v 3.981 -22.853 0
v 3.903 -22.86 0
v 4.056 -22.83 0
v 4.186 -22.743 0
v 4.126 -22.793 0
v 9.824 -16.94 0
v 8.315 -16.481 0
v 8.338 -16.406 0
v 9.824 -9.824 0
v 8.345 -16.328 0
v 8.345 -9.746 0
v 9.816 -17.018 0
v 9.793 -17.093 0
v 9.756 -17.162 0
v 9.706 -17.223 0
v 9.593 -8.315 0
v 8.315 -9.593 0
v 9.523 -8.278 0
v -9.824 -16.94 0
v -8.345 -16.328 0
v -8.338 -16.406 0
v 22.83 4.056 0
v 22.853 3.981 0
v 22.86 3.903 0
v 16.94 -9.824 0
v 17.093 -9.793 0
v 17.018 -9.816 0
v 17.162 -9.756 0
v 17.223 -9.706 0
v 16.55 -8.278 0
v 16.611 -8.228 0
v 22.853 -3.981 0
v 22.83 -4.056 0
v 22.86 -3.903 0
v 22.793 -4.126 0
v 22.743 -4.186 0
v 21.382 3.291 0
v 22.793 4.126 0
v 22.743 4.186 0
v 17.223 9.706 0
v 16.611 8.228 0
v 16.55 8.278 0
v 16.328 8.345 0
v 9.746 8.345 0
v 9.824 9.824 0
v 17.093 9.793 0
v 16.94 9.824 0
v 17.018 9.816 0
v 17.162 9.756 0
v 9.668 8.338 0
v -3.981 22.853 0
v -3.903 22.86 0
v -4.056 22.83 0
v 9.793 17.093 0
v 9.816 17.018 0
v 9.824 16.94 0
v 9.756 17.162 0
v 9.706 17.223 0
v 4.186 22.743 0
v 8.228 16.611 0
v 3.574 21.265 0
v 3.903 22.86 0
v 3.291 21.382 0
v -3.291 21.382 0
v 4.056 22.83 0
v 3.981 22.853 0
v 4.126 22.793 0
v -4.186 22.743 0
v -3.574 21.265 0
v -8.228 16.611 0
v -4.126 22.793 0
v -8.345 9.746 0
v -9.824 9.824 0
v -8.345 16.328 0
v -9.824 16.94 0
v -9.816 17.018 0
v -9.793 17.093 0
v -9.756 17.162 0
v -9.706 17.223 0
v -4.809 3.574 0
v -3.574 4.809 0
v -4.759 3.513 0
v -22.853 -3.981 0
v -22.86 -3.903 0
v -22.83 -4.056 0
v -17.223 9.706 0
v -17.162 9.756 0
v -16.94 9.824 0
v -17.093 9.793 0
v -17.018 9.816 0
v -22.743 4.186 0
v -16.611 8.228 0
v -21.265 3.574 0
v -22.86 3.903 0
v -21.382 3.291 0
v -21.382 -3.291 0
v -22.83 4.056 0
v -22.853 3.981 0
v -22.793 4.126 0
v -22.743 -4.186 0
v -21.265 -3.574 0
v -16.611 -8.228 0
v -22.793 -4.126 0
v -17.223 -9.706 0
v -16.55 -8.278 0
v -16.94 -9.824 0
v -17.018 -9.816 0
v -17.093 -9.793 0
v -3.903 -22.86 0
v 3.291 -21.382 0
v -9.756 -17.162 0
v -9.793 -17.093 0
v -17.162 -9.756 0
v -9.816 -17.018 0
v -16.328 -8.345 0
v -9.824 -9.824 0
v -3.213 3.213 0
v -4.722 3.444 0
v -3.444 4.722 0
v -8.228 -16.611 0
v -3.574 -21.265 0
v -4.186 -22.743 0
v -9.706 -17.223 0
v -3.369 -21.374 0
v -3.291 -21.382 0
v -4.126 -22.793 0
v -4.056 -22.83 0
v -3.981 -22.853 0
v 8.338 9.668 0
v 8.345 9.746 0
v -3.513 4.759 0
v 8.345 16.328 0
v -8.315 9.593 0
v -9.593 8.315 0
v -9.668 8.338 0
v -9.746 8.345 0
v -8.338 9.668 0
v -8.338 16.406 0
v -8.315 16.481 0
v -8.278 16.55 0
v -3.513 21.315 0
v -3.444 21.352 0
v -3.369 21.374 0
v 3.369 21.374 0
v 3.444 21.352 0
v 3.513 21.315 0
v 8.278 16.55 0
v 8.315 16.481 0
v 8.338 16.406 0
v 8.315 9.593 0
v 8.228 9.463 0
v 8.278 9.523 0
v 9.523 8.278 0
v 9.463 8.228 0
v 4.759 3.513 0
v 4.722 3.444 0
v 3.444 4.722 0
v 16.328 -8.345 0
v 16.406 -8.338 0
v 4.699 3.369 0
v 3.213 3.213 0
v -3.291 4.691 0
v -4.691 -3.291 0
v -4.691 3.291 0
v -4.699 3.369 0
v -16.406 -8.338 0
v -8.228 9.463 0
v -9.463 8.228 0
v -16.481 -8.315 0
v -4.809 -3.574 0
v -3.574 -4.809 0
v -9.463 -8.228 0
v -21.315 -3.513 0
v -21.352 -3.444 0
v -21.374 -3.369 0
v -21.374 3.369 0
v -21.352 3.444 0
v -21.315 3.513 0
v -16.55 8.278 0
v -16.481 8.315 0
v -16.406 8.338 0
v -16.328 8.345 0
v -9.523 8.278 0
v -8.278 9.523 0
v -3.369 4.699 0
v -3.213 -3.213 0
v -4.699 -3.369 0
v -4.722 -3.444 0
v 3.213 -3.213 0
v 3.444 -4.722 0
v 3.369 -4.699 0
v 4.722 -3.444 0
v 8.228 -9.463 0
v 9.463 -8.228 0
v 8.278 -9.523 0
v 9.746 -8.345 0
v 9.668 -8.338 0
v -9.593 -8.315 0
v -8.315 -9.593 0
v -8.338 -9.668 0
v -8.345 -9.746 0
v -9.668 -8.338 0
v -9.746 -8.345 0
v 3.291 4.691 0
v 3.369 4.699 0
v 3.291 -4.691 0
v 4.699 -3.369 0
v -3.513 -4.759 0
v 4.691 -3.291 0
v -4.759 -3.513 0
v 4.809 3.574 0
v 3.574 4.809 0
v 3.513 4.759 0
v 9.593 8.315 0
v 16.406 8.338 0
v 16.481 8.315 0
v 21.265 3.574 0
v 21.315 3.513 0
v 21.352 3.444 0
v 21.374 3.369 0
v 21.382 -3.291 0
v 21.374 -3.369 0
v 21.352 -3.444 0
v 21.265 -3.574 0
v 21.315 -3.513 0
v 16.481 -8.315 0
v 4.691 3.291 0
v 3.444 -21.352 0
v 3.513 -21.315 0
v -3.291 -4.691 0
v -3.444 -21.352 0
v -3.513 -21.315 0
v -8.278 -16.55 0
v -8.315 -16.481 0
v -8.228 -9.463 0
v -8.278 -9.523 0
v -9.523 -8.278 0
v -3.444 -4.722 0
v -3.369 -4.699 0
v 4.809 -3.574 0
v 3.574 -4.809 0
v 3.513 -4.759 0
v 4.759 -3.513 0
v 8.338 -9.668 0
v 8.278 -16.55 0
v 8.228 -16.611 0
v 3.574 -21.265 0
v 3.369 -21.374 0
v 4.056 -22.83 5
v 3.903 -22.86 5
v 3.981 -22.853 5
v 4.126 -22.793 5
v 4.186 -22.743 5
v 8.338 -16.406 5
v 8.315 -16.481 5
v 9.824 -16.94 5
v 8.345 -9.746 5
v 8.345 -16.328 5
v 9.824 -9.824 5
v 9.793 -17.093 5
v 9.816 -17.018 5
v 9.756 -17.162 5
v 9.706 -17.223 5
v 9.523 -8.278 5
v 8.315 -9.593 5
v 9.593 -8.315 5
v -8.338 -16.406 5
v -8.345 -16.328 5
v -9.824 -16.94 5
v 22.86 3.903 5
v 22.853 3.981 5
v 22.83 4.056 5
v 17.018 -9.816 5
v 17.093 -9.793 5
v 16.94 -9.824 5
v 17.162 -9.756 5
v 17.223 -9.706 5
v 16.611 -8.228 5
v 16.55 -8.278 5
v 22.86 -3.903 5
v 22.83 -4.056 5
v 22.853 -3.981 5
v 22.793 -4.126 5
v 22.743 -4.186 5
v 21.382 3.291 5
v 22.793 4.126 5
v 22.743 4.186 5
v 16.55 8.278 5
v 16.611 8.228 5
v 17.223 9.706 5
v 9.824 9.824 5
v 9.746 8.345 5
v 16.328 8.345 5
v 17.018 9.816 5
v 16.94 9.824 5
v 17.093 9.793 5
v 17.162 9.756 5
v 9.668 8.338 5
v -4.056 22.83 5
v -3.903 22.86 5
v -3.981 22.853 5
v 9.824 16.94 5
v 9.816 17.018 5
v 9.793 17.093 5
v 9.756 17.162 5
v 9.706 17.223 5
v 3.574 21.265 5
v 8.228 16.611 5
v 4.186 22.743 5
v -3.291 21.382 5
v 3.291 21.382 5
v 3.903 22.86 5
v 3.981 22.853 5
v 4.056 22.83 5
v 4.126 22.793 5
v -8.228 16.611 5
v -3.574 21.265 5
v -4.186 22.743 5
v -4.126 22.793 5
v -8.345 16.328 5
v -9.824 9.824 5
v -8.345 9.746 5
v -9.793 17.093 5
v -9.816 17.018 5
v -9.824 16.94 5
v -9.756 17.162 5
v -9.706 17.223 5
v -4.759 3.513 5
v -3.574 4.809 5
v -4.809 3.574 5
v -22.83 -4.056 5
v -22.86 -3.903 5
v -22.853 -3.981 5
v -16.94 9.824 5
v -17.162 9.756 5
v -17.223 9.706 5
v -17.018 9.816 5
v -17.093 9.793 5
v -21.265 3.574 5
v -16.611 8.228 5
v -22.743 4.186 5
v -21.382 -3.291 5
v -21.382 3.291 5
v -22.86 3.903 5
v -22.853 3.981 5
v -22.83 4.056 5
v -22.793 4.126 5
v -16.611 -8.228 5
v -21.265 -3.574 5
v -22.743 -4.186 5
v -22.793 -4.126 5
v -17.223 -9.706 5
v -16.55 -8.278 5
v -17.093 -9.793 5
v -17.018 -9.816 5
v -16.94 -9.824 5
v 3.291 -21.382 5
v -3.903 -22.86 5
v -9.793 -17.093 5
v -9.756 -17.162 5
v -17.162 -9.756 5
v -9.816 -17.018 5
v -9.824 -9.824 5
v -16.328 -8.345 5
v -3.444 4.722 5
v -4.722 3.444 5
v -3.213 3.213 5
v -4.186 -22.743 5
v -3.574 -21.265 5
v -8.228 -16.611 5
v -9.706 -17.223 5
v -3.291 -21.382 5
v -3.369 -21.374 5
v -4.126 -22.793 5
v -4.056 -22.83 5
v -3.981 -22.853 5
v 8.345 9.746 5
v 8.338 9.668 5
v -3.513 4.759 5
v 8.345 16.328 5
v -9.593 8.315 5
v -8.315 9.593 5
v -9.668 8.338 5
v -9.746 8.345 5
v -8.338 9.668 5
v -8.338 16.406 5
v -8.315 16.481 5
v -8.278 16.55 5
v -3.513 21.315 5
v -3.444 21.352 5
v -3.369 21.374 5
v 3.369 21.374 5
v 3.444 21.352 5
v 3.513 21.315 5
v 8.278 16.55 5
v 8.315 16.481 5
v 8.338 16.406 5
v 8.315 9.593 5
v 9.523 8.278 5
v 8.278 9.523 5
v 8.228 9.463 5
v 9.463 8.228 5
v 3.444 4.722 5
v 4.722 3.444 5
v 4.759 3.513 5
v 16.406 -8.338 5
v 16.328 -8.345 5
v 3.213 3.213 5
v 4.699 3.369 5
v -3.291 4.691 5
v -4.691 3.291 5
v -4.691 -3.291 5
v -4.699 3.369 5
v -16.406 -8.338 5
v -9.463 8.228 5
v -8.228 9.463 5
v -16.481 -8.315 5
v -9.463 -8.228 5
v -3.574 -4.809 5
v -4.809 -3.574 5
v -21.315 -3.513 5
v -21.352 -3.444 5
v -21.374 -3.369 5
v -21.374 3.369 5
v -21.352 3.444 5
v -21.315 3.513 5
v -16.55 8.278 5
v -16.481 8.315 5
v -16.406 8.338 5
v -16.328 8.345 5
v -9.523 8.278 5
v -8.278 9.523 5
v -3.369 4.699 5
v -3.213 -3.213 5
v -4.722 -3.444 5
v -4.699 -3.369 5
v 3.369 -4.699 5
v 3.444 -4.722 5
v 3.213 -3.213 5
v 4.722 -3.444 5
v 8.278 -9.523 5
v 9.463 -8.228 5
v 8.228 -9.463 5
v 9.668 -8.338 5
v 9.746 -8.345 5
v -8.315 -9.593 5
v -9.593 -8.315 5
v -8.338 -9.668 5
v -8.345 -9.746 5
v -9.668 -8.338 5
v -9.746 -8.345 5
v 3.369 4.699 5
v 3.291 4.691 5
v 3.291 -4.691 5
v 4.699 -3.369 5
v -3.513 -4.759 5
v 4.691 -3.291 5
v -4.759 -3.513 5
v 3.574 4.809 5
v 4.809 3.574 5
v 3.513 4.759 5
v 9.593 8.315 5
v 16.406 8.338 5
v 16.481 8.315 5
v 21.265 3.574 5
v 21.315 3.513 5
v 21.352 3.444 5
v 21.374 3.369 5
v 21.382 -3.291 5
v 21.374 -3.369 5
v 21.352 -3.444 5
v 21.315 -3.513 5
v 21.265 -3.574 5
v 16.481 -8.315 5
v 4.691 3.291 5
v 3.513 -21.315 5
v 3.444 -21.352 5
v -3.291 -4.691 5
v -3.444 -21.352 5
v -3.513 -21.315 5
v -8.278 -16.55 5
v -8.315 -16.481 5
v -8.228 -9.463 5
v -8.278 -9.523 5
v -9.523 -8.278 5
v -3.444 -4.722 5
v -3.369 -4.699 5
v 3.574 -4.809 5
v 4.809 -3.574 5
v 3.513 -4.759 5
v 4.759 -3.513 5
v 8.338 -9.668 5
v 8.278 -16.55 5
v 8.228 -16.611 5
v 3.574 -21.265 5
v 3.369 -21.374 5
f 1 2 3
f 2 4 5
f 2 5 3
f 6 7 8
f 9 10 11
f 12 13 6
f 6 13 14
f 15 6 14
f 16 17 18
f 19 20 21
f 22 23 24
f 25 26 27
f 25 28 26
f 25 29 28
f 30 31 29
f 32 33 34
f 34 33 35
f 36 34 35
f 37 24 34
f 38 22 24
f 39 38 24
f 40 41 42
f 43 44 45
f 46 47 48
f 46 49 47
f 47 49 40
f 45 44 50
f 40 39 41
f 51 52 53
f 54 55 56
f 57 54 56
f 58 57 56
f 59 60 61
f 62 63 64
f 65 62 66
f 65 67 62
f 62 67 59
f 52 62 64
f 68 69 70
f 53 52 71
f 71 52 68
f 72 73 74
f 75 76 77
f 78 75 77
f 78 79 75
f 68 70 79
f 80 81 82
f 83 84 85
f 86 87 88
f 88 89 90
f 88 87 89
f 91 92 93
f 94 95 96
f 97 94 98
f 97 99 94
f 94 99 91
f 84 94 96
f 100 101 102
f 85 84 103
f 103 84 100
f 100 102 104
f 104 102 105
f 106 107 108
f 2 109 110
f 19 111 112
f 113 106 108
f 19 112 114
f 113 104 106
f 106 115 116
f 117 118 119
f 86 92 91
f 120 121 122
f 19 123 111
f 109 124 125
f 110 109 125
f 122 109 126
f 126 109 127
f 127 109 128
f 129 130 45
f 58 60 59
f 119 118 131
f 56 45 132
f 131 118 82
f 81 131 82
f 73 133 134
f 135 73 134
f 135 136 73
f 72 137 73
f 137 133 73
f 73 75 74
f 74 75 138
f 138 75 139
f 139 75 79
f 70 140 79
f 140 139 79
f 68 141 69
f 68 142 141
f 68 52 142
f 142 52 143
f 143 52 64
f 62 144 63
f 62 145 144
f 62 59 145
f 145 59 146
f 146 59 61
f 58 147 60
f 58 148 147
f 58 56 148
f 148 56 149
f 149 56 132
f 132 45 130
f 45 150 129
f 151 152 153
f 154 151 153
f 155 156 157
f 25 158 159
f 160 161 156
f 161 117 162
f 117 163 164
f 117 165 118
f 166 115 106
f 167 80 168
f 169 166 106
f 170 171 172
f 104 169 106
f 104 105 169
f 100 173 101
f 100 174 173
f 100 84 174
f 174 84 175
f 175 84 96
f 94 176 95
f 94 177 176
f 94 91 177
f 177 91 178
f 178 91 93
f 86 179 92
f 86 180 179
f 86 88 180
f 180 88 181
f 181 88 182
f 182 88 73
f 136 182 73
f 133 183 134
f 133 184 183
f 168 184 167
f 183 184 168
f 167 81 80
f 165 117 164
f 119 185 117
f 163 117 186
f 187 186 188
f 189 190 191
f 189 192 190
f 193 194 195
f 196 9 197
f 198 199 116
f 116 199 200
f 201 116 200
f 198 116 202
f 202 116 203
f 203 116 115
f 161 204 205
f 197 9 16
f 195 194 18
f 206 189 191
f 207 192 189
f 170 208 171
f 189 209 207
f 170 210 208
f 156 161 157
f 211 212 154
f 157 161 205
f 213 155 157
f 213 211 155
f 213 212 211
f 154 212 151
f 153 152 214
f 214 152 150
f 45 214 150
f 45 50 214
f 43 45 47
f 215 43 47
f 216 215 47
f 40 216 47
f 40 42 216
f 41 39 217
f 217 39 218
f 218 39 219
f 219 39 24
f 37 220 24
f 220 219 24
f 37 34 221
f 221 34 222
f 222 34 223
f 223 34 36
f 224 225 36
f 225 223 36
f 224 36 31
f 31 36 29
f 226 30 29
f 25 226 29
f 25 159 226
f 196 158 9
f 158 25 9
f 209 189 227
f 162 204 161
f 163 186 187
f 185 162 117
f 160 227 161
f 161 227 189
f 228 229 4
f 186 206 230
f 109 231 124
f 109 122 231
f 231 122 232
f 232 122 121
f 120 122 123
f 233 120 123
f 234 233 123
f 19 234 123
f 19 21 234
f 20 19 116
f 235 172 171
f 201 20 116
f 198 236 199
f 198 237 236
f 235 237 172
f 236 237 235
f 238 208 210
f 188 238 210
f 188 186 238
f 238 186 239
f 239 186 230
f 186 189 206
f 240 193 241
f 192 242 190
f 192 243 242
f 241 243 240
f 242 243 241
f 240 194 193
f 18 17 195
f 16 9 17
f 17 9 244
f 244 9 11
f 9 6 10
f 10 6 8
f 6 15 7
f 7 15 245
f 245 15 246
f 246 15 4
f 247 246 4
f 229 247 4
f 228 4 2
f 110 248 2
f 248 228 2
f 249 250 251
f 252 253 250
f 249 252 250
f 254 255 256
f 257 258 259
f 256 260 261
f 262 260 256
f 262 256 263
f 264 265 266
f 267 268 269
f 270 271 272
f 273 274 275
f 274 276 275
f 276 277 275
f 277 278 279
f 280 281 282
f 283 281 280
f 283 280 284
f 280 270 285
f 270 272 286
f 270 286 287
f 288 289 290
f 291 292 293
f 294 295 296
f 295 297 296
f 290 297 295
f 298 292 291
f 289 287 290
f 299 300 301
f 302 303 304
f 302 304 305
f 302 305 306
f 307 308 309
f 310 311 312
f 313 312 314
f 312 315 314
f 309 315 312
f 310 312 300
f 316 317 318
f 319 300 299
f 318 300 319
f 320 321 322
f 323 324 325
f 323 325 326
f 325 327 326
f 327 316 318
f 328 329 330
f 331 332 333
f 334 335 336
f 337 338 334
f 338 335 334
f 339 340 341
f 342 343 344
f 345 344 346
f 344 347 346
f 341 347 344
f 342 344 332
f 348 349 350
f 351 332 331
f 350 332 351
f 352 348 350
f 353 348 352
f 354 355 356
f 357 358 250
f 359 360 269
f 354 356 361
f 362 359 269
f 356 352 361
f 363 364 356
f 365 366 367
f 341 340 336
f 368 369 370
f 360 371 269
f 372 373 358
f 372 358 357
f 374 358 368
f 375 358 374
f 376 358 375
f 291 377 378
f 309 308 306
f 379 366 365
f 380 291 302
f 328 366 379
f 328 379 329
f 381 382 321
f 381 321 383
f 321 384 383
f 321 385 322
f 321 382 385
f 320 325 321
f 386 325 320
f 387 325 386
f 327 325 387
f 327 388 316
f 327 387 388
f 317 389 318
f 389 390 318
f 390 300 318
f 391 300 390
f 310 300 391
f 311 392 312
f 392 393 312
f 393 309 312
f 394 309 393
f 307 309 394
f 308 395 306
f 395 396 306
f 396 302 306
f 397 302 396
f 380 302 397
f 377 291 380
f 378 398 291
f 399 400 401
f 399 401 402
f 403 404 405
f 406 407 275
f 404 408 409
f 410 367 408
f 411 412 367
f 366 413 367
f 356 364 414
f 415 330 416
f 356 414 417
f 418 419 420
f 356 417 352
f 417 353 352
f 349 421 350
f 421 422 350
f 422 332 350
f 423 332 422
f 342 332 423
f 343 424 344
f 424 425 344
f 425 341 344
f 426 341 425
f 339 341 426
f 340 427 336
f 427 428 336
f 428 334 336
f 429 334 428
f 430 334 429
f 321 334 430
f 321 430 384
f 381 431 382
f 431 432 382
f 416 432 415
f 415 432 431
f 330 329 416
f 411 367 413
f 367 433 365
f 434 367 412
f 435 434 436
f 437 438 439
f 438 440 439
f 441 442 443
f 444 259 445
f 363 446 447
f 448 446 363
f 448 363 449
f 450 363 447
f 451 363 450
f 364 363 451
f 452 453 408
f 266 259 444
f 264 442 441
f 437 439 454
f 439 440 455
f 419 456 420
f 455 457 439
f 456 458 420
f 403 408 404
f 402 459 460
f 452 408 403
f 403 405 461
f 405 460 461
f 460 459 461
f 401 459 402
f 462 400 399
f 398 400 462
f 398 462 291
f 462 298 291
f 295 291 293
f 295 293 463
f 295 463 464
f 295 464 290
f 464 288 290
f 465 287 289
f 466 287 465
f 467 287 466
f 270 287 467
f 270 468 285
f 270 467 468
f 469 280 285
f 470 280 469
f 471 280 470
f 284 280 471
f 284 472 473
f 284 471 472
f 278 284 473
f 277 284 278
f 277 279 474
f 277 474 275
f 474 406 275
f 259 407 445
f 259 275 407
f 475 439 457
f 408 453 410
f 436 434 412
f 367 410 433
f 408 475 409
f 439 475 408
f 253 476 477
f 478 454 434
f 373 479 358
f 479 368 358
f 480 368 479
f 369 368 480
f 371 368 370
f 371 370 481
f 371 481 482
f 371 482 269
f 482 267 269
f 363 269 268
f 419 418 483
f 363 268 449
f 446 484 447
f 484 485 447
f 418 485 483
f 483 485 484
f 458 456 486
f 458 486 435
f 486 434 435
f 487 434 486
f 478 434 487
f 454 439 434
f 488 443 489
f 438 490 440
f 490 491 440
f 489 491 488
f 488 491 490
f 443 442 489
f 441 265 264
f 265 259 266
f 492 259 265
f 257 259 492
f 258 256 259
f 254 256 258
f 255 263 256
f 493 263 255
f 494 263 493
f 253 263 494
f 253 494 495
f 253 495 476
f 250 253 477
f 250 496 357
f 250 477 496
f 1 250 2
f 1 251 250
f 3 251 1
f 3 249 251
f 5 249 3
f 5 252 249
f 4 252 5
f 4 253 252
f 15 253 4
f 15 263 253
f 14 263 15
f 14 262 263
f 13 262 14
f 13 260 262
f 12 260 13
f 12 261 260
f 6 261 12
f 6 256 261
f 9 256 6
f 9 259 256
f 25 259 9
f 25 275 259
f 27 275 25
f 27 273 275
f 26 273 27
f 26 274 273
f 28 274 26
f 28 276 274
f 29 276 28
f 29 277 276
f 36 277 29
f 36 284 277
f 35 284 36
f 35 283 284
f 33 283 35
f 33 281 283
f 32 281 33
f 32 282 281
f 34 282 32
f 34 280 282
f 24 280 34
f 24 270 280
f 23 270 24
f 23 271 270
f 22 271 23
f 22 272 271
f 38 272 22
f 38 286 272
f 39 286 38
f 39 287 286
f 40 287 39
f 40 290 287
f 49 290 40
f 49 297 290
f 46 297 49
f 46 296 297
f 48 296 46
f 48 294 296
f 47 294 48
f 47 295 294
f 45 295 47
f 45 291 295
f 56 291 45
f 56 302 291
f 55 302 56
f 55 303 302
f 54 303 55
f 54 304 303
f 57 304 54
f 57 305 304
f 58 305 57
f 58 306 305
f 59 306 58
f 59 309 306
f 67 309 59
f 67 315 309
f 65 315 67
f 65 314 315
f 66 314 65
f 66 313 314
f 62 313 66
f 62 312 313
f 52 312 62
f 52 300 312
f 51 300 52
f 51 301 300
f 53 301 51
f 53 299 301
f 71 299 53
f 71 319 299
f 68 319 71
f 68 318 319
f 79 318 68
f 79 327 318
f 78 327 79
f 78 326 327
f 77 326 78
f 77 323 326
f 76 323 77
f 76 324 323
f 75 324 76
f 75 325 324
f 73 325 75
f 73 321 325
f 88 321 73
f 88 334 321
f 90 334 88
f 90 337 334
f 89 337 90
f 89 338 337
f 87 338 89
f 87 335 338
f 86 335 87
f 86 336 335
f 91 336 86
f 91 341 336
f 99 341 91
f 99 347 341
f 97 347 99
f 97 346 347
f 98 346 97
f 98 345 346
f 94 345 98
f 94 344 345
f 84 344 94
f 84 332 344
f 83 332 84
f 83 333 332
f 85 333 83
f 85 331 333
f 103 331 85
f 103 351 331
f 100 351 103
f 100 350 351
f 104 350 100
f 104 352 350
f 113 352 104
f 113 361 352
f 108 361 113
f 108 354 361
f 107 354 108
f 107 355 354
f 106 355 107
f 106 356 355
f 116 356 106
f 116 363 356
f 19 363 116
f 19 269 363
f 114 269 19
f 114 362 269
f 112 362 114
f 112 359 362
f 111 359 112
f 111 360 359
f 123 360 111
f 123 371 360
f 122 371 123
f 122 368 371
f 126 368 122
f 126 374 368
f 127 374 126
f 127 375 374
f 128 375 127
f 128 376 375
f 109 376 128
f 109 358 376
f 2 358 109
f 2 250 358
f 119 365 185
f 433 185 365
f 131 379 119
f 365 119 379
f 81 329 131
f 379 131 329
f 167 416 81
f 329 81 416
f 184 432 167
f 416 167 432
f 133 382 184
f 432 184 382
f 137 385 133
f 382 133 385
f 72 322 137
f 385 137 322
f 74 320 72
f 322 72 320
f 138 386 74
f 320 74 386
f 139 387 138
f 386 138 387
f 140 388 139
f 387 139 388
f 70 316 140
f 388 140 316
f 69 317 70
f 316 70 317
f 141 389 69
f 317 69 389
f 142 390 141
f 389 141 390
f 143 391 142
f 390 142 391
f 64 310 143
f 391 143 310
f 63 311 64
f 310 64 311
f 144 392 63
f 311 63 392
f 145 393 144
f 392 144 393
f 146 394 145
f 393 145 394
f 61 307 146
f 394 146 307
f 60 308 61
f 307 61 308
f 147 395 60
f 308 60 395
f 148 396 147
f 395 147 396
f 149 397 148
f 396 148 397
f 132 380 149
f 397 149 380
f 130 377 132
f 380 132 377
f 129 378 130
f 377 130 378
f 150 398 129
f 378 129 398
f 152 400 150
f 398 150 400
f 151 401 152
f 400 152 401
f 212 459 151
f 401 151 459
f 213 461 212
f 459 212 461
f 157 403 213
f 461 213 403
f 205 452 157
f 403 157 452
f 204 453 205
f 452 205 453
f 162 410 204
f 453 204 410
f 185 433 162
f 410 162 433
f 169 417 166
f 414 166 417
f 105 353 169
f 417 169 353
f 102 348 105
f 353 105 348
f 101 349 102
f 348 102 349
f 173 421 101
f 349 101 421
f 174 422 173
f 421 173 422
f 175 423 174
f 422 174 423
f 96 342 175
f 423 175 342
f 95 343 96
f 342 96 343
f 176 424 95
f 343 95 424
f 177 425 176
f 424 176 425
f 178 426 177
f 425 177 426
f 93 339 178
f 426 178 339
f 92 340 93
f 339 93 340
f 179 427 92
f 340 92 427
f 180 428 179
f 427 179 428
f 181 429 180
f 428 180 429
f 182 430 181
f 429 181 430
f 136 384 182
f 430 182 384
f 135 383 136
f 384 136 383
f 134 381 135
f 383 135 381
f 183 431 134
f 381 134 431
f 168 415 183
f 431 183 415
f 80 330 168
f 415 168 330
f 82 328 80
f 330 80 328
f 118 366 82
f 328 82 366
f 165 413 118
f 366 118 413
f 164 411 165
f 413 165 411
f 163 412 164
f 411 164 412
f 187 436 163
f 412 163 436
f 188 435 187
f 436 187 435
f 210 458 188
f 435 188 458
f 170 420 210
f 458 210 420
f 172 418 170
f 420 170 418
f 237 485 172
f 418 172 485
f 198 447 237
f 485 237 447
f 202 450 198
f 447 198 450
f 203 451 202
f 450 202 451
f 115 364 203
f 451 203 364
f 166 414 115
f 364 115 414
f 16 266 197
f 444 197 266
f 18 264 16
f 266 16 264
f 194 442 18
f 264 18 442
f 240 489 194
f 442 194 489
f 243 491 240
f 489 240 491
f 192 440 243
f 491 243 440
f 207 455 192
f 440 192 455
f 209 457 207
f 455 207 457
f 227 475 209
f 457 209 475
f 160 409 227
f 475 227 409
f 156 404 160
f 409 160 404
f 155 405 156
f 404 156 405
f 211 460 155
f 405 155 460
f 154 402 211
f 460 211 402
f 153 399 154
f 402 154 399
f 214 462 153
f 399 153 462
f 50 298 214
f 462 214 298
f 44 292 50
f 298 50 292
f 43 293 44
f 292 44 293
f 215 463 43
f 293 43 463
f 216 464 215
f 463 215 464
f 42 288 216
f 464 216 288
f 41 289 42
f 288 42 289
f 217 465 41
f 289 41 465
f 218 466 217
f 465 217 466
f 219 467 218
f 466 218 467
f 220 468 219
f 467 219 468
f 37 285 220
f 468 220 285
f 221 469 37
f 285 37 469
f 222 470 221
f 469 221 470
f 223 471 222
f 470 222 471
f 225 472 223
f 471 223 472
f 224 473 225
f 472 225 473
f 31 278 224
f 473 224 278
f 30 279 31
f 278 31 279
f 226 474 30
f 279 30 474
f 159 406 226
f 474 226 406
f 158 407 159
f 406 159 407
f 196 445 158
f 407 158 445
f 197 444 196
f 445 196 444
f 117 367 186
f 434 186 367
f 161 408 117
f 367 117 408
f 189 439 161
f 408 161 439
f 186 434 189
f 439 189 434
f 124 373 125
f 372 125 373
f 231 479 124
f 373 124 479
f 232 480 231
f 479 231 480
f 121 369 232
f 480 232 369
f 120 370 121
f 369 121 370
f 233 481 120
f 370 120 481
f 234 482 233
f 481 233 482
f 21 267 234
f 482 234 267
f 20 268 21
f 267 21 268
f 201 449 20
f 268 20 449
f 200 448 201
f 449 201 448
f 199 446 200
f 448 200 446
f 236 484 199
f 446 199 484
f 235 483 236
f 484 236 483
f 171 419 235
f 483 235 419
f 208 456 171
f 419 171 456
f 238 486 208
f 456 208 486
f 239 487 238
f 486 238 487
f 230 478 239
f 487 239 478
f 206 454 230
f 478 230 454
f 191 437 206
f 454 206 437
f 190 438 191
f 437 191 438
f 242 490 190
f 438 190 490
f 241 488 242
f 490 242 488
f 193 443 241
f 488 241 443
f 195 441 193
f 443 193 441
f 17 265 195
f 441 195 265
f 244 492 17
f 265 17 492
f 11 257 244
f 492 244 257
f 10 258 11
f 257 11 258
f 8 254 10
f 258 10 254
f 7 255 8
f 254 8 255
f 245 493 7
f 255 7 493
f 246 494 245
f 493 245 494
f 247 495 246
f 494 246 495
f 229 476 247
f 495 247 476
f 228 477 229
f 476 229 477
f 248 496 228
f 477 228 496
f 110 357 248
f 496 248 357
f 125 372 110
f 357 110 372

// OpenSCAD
TSIDE = 18;
SIDE = 9;
SMOOTH = .4;
SQRT22 = sqrt(2) / 2;
SIDESQ22 = SIDE * SQRT22;
WALL_WIDTH = 1.6;
WALL_OVERLAP = WALL_WIDTH / 4 * 3;

module hexagon(side, offset = 0) {
  s = side - offset;
  
  offset(r = offset, $fn = 32)
    union()
      for(i = [0 : 1 : 6]) 
        rotate([0, 0, i * 60])
            polygon([
              [0, 0], 
              [s / 2, s * sqrt(3) / 2],
              [s / -2, s * sqrt(3) / 2]
            ]);
    
}

module octagon(side, offset = 0) {
  s = side - offset;
  
  offset(r = offset, $fn = 32)
    union()
      for(i = [0 : 1 : 7]) 
        rotate([0, 0, i * 45])
            polygon([
              [-s * cos(135 / 2), s * sin(135 / 2)], 
              [s * cos(135 / 2), s * sin(135 / 2)],
              [0, 0]
            ]);
    
}

module hexa() {
  difference() {
    octagon(SIDE + WALL_WIDTH, SMOOTH);
    octagon(SIDE, SMOOTH);
  }
}

linear_extrude(5) {
  s = SIDE + (SMOOTH / 2) + WALL_WIDTH;
  ty = (sqrt(2) * s / 2) + (s / 2);
  
  rotate([0, 0, 0]) translate([0, ty, 0]) hexa();
  rotate([0, 0, 90]) translate([0, ty, 0]) hexa();
  rotate([0, 0, 180]) translate([0, ty, 0]) hexa();
  rotate([0, 0, 270]) translate([0, ty, 0]) hexa();
}
